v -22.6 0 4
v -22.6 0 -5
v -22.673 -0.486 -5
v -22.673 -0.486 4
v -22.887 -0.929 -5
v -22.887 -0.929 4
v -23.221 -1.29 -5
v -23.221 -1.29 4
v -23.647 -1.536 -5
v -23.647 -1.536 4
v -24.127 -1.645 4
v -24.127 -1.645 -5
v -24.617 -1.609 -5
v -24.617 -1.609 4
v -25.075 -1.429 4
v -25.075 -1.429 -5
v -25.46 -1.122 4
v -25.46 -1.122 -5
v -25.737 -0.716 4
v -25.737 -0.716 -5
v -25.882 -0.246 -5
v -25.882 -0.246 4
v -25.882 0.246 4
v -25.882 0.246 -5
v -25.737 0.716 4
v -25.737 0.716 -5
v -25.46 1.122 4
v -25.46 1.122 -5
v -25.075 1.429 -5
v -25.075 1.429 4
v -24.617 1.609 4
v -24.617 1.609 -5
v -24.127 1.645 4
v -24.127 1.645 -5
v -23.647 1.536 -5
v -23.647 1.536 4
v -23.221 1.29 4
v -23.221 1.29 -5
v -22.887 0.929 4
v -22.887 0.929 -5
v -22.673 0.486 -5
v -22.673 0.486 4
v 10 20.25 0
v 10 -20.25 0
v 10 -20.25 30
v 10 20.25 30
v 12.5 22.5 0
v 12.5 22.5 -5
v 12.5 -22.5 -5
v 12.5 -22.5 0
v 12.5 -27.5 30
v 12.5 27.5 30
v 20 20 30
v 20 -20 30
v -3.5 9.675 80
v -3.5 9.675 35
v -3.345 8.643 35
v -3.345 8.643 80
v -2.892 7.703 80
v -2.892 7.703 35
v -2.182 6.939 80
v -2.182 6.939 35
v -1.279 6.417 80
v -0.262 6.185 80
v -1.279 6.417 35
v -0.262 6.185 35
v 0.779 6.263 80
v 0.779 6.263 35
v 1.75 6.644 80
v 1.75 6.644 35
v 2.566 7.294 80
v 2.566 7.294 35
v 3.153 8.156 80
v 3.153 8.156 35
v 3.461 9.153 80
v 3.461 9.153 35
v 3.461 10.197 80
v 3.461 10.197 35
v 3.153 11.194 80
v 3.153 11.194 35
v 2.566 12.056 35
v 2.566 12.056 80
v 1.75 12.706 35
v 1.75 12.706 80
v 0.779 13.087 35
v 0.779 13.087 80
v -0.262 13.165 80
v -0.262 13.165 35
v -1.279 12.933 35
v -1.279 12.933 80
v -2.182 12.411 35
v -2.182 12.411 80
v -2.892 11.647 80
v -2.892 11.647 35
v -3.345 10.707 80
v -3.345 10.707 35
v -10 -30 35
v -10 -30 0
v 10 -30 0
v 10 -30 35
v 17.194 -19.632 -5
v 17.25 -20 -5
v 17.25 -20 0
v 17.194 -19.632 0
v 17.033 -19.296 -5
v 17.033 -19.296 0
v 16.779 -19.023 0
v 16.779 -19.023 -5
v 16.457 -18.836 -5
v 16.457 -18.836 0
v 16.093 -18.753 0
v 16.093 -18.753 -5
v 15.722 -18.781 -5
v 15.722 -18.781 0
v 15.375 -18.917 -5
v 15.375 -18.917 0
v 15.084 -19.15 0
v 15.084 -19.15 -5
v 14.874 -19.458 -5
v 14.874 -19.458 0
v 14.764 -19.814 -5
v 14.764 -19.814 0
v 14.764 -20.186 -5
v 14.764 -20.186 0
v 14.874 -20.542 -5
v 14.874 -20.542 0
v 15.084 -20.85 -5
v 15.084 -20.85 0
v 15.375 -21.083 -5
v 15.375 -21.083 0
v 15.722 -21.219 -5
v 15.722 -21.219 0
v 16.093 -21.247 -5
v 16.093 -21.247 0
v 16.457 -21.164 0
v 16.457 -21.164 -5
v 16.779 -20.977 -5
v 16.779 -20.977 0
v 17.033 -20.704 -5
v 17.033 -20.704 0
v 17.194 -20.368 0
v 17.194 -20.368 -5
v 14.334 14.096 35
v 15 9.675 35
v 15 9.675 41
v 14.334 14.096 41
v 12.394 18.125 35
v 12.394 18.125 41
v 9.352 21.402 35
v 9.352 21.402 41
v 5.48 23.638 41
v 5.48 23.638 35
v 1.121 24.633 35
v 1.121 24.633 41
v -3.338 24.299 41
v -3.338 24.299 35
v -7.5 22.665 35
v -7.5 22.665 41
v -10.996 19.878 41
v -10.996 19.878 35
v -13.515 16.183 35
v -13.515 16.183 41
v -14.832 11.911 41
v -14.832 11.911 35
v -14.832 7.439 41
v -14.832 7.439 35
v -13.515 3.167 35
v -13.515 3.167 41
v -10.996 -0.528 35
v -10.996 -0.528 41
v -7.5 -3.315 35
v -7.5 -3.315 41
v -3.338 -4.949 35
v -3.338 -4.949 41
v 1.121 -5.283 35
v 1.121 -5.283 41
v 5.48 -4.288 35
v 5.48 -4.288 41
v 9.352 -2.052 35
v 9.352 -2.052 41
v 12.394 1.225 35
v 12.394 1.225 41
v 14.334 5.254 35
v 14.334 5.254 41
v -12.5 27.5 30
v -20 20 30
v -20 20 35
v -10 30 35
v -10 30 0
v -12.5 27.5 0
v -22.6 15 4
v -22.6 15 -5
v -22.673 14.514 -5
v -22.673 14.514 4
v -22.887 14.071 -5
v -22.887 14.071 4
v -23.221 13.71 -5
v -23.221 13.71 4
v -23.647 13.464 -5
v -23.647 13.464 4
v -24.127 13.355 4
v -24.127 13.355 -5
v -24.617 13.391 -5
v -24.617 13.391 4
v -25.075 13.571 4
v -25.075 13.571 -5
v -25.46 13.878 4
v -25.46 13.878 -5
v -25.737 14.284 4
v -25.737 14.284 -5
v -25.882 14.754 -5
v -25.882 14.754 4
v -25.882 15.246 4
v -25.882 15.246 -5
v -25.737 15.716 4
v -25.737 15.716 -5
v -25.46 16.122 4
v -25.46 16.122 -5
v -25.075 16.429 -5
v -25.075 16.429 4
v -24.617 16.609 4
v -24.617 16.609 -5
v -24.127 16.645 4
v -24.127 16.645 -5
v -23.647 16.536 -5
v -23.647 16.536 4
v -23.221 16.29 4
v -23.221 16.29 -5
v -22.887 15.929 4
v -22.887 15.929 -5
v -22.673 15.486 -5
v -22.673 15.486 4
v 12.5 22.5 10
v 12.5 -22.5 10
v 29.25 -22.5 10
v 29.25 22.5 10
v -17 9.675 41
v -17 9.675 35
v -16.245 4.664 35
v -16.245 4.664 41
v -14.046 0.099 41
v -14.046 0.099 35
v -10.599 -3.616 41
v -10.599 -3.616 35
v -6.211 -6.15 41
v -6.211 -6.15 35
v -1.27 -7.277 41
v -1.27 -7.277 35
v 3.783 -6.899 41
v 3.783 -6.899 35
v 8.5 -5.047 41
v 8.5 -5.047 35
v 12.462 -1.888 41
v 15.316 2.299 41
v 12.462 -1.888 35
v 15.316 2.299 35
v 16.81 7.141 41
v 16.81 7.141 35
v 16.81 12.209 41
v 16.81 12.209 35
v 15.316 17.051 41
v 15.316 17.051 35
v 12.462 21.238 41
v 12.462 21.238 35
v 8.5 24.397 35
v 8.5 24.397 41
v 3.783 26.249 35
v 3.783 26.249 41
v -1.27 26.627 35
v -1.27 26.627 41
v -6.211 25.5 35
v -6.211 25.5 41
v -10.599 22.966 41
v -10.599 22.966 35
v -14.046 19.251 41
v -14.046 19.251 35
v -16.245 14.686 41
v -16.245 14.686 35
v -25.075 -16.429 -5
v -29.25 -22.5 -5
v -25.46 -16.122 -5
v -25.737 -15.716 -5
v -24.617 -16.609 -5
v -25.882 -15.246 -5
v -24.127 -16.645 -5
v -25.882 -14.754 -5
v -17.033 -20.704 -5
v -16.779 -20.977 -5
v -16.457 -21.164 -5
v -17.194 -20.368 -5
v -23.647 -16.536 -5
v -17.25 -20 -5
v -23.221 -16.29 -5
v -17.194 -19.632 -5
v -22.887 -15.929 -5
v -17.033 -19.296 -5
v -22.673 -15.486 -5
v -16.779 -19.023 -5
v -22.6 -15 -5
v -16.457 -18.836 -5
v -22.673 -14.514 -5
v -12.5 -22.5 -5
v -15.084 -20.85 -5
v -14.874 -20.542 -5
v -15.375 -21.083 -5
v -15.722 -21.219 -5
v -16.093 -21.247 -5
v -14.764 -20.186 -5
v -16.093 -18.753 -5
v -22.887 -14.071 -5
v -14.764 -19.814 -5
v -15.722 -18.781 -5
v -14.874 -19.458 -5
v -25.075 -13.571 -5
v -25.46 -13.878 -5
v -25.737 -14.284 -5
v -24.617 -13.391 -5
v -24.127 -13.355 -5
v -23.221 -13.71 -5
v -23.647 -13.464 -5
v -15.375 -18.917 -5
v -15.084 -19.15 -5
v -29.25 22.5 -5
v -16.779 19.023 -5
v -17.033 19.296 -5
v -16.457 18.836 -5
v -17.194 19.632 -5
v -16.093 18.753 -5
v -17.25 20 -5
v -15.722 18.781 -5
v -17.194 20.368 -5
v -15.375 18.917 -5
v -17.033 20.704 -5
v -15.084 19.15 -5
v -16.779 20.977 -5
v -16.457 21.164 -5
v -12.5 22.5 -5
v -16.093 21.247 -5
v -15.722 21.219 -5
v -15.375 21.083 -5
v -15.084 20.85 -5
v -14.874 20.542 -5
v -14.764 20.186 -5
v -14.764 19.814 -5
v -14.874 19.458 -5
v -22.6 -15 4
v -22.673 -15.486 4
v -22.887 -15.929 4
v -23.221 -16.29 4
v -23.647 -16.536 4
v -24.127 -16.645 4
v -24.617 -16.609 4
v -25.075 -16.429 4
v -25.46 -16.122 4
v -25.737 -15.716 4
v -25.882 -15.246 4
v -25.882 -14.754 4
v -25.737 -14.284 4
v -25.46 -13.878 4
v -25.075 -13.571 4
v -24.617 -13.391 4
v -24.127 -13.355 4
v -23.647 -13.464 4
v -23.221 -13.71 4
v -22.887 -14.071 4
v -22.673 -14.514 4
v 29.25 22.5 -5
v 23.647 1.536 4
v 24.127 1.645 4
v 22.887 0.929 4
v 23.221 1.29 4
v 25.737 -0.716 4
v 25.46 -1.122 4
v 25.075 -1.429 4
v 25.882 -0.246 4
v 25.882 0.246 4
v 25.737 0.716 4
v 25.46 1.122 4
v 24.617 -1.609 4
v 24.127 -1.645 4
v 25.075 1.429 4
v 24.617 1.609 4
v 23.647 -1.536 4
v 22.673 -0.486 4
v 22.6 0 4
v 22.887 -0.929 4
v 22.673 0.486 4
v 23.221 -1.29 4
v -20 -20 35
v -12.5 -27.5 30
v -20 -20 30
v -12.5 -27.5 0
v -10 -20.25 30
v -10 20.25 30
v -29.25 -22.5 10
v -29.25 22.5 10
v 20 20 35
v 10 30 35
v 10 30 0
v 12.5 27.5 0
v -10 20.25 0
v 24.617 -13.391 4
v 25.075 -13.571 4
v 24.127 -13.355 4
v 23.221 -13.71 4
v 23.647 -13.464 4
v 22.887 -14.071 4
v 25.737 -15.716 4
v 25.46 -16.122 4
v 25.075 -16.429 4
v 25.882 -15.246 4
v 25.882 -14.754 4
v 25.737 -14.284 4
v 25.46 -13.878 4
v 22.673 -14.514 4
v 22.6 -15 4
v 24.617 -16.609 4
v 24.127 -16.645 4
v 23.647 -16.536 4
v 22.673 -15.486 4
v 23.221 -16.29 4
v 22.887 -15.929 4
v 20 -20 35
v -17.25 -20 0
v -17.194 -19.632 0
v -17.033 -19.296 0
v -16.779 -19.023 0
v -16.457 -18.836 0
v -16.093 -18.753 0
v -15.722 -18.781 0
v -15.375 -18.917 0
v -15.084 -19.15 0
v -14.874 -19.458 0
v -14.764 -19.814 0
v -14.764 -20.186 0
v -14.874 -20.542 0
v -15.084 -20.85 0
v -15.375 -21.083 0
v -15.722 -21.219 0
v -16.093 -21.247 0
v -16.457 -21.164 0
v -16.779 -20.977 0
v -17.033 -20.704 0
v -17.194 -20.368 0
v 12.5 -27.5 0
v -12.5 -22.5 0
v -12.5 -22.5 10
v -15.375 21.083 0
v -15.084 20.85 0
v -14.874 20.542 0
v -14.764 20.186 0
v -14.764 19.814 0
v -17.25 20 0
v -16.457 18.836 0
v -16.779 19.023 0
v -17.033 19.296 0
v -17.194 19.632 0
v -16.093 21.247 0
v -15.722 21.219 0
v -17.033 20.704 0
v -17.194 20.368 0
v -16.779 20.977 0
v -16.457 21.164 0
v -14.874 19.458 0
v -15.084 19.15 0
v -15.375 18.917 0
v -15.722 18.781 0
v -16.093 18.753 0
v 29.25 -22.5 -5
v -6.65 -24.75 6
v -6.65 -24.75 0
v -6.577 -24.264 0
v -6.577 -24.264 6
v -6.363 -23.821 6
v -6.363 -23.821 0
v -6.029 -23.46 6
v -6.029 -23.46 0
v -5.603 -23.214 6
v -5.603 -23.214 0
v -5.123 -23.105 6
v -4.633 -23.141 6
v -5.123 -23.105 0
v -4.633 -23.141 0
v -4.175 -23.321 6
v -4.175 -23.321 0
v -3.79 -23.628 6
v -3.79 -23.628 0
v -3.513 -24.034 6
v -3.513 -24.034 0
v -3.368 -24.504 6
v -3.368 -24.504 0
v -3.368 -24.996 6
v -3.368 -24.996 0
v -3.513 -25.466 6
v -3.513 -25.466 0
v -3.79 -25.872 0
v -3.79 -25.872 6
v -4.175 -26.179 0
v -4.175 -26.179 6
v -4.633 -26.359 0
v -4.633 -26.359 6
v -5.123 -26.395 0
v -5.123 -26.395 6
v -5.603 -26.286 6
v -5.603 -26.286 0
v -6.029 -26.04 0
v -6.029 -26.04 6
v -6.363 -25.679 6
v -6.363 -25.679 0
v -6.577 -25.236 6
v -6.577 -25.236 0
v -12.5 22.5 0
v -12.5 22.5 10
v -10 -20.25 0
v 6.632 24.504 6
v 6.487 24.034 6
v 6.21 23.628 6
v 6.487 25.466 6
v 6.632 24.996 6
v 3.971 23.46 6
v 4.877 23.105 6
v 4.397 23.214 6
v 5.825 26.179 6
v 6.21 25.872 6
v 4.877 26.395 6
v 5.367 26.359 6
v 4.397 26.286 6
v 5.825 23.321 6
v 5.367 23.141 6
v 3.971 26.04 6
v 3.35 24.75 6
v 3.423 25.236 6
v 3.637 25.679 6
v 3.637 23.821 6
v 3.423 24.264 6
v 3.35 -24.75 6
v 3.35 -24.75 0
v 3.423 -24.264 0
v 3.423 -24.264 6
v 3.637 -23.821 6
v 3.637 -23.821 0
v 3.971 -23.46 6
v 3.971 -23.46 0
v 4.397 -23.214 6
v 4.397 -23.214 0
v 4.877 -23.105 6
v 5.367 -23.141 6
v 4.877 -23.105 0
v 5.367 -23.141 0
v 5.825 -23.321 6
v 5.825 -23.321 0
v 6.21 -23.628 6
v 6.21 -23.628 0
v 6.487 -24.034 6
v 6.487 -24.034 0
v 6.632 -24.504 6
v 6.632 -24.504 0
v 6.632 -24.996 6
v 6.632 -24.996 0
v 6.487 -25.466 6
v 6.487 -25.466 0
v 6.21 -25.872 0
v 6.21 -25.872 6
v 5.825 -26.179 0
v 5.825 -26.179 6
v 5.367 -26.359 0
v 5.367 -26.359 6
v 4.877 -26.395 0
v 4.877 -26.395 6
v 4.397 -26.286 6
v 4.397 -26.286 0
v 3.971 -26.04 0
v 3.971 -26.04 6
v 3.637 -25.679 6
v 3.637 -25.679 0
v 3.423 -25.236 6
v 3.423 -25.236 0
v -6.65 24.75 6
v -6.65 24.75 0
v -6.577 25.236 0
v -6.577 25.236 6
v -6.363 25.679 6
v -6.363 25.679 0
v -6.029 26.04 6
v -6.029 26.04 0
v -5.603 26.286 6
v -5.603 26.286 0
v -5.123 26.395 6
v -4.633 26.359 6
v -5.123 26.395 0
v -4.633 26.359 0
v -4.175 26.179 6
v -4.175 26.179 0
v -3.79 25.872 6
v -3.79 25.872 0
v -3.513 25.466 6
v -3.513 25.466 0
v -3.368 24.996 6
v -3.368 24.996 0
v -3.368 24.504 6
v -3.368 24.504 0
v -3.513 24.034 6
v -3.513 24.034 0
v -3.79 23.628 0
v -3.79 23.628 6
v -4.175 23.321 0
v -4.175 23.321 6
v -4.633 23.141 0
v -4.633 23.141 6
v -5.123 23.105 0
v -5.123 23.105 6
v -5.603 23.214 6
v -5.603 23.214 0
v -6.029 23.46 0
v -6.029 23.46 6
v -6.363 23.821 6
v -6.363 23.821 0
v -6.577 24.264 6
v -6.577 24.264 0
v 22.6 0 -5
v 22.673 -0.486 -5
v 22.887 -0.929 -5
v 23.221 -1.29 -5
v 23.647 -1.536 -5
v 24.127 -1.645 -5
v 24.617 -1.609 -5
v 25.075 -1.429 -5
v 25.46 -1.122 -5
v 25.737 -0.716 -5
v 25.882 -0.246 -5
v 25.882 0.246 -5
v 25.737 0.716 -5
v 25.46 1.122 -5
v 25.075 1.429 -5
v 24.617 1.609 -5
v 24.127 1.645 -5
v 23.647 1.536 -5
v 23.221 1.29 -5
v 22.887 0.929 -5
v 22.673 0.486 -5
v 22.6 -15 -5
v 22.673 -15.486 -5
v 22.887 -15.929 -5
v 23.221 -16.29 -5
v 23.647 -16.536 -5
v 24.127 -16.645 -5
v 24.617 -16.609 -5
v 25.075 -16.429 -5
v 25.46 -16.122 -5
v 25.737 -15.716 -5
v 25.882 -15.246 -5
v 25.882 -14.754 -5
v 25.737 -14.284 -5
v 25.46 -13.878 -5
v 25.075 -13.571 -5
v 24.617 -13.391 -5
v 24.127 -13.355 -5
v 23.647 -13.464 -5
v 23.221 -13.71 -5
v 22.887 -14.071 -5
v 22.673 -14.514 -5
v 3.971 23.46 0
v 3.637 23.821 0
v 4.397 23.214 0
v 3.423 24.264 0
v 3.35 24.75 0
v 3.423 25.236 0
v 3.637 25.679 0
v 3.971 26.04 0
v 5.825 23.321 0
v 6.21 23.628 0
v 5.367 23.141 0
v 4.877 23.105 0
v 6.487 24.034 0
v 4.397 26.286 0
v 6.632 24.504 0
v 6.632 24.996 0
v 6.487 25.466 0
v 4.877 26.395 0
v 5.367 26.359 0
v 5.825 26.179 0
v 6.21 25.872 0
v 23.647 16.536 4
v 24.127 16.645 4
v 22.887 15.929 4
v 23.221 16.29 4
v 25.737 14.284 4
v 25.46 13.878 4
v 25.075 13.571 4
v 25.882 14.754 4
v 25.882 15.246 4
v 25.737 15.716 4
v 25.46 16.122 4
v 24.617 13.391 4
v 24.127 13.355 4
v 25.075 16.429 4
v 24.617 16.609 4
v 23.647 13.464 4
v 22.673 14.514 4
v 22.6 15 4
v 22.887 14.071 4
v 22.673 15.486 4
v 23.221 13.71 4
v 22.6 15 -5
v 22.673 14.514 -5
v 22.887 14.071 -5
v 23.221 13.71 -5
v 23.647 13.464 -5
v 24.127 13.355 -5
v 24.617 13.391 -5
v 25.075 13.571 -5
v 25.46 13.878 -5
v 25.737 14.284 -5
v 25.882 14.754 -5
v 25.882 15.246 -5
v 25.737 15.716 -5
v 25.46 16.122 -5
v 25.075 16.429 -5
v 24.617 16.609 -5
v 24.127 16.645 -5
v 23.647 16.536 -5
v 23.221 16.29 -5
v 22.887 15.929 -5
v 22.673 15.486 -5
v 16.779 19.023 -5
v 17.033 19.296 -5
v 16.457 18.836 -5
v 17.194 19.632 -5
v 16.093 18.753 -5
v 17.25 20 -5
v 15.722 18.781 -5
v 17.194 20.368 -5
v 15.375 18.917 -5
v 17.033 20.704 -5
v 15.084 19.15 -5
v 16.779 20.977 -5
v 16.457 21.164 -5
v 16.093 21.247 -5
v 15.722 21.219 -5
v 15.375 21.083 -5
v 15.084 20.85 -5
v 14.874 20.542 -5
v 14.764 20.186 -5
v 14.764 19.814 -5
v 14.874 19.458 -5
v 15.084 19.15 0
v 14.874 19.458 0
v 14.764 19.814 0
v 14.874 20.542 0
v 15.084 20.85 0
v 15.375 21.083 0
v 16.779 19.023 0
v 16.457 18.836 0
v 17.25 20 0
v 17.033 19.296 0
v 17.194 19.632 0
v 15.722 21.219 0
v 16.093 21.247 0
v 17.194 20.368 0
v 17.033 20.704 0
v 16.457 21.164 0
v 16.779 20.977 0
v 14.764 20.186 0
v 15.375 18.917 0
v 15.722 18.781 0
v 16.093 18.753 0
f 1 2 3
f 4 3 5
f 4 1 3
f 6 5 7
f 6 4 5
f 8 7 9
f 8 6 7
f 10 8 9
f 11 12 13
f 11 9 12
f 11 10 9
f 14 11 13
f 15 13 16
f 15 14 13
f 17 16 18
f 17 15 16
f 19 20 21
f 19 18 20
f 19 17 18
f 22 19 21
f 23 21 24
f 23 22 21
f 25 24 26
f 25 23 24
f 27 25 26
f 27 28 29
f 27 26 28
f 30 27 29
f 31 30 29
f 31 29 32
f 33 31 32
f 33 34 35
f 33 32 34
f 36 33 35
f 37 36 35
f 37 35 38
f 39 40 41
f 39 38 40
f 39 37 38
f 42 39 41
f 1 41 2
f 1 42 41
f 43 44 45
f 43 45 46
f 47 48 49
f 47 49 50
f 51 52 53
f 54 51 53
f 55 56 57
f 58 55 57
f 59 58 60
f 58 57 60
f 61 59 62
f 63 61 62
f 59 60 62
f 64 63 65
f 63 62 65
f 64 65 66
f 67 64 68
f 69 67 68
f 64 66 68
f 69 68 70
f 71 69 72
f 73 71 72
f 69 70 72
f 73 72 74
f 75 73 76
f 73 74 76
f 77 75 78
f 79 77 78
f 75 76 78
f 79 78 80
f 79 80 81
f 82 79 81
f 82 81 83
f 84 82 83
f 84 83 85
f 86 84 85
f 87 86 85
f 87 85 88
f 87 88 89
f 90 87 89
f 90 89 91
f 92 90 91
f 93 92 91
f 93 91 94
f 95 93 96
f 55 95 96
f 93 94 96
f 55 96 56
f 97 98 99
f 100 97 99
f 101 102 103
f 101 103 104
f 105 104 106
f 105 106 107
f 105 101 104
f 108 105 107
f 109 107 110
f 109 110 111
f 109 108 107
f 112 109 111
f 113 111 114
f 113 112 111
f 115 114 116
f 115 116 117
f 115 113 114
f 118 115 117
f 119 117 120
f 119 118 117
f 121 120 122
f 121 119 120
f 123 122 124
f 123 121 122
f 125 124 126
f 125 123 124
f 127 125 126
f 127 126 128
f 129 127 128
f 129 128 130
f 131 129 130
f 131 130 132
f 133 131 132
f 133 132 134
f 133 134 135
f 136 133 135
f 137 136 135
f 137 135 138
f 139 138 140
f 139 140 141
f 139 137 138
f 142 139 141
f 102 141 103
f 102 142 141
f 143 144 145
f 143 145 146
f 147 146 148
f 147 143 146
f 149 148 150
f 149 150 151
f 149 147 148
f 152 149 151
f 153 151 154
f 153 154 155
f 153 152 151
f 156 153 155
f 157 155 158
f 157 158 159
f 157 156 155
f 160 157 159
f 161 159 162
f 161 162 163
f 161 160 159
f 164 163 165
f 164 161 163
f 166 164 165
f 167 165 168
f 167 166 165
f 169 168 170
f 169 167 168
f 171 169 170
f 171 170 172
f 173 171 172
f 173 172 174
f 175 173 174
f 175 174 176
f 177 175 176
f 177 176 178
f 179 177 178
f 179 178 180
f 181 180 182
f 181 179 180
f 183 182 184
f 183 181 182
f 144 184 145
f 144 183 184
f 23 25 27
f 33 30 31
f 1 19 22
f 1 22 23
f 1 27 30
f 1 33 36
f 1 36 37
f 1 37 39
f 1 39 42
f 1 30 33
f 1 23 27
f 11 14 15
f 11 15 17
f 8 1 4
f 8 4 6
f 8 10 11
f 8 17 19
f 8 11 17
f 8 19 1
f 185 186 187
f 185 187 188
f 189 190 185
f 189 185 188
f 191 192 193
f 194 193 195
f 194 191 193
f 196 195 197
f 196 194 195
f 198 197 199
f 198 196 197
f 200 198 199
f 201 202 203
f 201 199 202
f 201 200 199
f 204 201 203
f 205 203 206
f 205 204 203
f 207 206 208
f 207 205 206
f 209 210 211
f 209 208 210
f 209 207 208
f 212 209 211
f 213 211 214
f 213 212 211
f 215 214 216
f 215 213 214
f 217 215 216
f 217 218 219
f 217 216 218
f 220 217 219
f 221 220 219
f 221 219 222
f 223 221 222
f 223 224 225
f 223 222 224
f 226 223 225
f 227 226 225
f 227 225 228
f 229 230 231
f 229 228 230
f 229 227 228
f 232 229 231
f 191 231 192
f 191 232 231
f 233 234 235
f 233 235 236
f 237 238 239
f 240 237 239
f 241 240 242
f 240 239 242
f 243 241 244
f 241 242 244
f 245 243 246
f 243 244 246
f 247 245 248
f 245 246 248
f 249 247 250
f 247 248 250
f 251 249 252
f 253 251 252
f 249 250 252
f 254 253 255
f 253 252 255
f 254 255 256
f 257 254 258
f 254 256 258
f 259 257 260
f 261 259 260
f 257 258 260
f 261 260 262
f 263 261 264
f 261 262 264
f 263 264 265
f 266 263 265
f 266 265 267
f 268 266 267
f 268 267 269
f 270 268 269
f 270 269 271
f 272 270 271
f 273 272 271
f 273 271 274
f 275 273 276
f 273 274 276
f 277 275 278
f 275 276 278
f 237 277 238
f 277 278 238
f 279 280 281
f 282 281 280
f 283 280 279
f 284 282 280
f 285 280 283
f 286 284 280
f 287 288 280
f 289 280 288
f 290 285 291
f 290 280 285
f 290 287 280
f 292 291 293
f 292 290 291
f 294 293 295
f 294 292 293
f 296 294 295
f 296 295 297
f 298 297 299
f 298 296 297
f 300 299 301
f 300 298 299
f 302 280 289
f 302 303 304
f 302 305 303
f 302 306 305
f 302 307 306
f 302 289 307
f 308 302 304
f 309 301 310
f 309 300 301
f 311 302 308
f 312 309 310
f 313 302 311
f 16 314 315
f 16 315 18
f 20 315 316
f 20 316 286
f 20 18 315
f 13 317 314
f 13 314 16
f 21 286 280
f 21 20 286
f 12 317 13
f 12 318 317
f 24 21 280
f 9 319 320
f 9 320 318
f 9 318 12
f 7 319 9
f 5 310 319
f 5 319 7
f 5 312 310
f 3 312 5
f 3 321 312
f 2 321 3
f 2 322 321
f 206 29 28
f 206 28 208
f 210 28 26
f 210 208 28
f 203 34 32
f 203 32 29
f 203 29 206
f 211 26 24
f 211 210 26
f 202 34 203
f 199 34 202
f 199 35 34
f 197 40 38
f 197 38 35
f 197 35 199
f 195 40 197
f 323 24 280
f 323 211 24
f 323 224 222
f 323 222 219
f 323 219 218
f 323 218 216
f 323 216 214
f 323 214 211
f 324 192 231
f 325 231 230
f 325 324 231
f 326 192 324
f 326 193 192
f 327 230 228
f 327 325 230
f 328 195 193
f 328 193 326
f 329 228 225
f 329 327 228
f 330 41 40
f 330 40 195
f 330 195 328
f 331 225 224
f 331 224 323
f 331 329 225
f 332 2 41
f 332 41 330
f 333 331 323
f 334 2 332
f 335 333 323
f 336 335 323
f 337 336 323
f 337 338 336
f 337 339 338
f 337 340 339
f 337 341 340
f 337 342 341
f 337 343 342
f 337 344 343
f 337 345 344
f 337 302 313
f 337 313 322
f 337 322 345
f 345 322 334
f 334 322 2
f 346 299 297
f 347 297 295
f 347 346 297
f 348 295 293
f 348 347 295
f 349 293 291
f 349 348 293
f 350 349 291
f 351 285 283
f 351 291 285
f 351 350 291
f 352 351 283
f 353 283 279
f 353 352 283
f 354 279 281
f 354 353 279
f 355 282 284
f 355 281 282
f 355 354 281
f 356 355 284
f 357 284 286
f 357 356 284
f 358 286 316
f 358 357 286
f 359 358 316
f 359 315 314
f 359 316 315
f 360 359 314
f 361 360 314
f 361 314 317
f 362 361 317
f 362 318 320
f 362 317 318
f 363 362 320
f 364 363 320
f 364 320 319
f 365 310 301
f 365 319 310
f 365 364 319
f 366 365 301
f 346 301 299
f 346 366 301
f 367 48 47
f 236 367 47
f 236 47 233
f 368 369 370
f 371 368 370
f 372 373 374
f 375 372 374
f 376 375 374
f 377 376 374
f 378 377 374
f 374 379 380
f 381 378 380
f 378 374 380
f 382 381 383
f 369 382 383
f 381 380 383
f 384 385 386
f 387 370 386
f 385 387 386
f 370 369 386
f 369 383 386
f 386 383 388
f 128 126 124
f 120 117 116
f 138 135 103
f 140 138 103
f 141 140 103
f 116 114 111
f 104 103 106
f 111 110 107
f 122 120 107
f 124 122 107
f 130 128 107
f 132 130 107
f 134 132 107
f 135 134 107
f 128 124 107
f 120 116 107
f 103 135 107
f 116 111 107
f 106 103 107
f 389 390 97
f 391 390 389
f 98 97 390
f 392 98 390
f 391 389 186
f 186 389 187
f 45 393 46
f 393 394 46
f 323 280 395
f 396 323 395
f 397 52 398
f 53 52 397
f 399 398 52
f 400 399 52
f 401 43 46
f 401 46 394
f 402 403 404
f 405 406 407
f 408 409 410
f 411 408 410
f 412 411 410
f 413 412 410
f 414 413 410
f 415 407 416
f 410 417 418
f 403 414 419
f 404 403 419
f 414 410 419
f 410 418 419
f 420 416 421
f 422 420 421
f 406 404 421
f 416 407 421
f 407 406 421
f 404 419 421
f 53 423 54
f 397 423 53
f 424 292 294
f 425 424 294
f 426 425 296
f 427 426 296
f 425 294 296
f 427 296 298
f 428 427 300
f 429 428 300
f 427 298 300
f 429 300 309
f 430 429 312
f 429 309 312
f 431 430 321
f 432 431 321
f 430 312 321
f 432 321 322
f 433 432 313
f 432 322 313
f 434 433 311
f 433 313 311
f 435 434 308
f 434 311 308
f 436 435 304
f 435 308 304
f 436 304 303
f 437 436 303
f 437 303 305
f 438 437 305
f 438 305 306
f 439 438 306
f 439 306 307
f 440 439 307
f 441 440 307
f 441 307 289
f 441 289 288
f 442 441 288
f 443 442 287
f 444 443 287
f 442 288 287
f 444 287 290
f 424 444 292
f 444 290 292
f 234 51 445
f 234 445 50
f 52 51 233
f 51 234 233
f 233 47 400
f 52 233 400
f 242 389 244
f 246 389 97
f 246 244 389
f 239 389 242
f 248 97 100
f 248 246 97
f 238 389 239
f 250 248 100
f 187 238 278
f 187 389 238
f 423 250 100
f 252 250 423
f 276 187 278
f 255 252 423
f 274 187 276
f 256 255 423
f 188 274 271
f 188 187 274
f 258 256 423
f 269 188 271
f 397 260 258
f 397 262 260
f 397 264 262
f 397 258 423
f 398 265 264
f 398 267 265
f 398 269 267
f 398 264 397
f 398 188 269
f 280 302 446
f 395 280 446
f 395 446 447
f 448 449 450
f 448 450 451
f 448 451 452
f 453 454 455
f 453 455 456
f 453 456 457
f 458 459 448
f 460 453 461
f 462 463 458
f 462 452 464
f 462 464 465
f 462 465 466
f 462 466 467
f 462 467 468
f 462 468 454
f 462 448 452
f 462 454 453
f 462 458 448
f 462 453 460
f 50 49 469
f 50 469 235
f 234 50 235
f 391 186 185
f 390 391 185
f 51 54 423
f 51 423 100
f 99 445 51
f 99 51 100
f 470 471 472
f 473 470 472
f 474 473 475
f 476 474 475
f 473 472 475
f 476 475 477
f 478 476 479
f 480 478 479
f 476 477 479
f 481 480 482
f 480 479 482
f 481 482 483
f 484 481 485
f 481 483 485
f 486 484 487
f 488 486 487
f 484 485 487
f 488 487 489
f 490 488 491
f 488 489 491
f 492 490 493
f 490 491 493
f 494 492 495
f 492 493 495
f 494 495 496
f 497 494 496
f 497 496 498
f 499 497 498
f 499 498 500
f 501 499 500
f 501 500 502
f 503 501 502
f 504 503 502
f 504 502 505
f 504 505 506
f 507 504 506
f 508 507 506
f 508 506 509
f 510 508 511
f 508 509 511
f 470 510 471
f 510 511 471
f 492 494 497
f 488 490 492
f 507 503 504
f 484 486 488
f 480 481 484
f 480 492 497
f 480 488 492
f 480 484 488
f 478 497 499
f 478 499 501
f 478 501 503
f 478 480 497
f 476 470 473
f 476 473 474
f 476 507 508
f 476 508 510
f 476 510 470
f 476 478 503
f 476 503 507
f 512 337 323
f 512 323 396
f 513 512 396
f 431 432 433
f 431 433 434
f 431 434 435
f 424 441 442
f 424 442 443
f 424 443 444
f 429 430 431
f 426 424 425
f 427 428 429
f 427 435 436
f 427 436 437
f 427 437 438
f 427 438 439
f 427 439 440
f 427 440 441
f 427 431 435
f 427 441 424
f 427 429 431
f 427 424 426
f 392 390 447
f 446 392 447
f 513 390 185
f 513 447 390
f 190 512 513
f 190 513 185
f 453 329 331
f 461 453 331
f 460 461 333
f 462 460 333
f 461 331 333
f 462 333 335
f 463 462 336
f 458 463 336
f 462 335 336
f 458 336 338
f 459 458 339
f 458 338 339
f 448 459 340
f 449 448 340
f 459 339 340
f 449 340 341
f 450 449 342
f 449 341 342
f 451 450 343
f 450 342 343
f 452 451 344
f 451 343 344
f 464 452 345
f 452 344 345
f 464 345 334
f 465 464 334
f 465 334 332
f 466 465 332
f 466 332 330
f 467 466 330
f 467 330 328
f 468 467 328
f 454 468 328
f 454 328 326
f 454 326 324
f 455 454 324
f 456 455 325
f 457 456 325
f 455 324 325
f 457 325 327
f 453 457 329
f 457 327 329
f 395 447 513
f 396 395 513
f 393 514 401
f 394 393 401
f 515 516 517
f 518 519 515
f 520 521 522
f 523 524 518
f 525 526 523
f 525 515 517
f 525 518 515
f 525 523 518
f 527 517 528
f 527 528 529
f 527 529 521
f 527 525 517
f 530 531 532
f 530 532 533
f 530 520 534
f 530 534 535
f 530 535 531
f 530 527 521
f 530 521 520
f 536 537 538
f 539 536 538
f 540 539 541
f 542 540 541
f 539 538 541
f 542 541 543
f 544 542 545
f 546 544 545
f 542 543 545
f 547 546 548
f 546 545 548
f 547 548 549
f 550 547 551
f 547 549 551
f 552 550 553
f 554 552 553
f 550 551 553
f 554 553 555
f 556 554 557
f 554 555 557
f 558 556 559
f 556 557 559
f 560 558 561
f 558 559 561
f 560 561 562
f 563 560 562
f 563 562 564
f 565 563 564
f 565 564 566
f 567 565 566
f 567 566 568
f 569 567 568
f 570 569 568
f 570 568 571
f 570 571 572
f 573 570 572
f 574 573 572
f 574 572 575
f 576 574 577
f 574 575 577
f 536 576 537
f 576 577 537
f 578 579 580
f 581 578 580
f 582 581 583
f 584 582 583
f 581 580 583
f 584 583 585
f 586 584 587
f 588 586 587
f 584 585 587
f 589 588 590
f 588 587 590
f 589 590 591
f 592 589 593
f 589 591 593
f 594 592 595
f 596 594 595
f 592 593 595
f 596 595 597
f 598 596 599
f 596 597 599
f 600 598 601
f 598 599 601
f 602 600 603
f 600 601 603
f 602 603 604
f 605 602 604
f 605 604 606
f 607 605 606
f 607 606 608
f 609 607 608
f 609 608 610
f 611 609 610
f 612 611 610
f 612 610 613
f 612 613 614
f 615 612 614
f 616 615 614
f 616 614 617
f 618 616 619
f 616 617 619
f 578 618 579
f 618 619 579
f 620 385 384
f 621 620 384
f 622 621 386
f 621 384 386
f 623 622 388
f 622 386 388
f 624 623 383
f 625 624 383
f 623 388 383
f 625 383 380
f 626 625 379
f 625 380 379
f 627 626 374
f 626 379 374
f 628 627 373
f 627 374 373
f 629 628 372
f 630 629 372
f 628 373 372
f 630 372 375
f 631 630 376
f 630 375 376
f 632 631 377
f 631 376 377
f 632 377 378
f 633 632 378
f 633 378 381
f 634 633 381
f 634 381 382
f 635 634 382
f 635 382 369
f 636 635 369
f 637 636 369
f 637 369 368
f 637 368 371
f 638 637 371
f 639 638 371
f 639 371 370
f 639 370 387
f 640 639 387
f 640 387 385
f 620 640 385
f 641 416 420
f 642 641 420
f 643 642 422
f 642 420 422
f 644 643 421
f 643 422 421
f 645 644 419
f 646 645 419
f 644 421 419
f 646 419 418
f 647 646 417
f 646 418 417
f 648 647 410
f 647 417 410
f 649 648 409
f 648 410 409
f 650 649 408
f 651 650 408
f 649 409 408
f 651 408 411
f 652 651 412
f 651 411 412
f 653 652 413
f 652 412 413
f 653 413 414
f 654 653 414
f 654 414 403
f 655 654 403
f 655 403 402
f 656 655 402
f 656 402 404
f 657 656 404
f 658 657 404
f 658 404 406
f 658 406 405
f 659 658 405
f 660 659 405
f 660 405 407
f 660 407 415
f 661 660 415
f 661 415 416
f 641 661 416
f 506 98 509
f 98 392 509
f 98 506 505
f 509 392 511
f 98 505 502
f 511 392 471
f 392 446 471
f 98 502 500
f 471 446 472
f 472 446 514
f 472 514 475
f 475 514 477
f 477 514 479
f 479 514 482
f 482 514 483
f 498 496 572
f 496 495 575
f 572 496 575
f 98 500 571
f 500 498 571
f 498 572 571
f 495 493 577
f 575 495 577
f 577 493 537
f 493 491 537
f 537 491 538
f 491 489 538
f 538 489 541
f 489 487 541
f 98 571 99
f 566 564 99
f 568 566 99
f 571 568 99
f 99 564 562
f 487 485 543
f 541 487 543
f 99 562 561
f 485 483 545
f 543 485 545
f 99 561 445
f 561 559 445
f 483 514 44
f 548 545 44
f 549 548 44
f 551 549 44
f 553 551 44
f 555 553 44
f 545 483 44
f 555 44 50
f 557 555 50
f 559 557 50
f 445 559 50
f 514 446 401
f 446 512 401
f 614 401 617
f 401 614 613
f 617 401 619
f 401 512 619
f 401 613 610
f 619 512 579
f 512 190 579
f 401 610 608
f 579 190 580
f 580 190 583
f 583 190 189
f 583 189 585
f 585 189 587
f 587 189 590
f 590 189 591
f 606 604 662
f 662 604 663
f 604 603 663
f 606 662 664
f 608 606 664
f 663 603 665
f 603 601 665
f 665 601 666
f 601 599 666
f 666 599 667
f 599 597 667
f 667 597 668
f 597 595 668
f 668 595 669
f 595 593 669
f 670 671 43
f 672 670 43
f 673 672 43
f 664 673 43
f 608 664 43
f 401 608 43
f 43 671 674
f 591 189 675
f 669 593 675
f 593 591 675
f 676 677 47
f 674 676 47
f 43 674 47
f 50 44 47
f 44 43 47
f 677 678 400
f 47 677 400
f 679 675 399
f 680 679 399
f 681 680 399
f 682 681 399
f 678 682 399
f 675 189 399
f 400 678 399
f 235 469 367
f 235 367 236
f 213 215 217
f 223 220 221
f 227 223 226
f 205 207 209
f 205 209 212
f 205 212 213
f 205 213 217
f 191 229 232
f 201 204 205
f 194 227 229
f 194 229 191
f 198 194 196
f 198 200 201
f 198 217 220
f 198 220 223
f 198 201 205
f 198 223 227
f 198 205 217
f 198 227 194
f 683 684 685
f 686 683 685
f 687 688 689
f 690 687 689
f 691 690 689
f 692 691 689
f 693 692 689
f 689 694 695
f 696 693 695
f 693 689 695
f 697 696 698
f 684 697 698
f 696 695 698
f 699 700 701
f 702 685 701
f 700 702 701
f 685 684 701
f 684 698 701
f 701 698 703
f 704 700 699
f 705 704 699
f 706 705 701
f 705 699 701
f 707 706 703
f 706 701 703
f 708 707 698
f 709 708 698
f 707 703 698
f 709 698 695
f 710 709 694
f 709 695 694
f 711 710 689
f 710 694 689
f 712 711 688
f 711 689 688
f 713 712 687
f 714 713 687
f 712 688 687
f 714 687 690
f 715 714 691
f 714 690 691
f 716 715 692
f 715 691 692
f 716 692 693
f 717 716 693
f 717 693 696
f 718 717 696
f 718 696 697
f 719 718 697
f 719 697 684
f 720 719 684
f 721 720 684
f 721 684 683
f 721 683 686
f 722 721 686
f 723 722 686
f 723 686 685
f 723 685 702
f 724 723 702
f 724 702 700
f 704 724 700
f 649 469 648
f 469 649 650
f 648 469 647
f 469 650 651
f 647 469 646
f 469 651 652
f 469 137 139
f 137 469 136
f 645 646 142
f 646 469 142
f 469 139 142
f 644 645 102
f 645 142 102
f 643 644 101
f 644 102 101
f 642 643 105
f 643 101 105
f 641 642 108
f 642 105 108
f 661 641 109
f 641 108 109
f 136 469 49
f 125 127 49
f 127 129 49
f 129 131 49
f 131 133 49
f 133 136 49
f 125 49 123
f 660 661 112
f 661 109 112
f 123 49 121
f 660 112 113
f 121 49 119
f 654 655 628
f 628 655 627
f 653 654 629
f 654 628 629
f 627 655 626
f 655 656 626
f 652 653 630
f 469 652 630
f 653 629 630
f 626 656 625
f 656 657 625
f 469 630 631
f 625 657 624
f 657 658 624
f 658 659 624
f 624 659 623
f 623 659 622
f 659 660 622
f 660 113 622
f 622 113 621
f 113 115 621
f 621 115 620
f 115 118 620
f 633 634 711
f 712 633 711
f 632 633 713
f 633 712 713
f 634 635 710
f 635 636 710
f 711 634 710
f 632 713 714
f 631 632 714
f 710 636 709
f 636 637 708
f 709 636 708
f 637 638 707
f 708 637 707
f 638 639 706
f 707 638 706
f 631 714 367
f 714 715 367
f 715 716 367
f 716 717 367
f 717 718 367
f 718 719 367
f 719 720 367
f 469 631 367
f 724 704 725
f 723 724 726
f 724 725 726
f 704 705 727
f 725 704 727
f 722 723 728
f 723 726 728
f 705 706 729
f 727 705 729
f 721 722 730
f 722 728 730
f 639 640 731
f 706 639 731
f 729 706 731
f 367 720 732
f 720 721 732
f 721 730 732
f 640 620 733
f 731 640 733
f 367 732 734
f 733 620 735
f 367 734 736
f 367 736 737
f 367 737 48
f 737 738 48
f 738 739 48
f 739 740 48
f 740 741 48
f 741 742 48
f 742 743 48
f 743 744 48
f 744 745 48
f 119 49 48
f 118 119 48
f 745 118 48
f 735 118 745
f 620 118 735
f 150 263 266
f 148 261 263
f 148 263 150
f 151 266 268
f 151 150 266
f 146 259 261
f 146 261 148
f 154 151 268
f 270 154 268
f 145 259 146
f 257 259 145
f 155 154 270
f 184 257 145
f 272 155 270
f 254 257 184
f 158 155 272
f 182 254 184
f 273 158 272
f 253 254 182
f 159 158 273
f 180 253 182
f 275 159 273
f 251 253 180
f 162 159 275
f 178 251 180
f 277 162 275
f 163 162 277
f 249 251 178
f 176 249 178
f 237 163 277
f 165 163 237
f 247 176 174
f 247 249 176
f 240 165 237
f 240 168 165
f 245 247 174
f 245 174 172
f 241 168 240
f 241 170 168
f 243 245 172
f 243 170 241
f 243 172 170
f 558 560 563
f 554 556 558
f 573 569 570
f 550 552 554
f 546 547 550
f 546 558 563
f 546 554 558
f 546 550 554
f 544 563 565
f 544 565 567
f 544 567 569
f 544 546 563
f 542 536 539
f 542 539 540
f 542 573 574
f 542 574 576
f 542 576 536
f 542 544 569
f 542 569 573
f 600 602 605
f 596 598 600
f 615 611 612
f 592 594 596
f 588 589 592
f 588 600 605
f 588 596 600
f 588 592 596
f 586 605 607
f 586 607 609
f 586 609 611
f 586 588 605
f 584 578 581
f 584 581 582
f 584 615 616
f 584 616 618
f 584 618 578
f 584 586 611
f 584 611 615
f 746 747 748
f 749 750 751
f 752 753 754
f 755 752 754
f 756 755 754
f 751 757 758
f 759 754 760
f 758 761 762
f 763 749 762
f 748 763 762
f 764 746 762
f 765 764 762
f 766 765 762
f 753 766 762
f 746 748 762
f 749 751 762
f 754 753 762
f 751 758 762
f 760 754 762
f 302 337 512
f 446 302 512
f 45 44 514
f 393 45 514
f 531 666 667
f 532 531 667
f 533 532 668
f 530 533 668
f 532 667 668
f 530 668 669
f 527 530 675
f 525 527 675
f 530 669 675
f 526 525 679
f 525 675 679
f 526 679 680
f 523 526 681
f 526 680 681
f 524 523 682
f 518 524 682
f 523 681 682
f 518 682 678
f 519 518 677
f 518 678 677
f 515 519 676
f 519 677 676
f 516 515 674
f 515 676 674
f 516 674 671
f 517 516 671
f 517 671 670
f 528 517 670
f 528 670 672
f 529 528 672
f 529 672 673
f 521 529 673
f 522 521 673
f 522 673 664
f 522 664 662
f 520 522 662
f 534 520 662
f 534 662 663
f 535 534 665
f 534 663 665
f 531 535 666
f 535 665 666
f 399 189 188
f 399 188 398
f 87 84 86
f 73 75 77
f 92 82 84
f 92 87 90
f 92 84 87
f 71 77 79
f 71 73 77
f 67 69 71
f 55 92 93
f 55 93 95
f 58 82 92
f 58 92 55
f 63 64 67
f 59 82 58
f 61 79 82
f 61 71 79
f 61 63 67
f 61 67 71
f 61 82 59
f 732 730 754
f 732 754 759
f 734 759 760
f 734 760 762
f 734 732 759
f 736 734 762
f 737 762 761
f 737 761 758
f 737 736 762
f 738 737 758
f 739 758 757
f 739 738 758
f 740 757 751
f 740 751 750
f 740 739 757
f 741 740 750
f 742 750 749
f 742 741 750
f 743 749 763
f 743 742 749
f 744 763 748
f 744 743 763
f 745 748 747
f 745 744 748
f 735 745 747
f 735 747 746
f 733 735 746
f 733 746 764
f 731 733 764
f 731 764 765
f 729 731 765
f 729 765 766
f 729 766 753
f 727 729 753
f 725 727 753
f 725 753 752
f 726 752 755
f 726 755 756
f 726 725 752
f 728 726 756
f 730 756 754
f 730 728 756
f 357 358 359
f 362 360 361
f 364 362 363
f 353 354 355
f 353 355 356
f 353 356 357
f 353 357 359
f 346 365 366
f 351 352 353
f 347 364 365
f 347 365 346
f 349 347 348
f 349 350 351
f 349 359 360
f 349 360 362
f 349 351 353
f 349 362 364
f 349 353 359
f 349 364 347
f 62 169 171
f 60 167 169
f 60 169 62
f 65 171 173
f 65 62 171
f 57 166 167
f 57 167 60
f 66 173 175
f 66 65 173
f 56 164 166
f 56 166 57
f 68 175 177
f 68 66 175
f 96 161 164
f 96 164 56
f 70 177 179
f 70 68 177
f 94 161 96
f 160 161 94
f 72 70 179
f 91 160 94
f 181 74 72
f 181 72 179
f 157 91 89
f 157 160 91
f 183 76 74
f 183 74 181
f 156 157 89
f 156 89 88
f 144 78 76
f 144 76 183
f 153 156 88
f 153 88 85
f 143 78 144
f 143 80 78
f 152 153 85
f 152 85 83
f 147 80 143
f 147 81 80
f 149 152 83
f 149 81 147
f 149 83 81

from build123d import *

# Parameters (mm, degrees)
SKETCH_1_W          = 25
SKETCH_1_H          = 60
EXTRUDE_1_DEPTH     = 35
SKETCH_2_W          = 20
SKETCH_2_H          = 40.5
CUT_EXTRUDE_1_DEPTH = 31.5
SKETCH_5_W          = 40
SKETCH_5_H          = 60
EXTRUDE_4_DEPTH     = 5
SKETCH_6_R          = 1.65
CUT_EXTRUDE_2_DEPTH = 6
SKETCH_10_W         = 15
SKETCH_10_H         = 45
EXTRUDE_7_DEPTH     = 16.75
SKETCH_18_R         = 1.25
CUT_EXTRUDE_4_DEPTH = 5
CUT_EXTRUDE_START   = -4
SKETCH_17_R         = 1.65
CUT_EXTRUDE_3_DEPTH = 12
SKETCH_13_R         = 3.5
EXTRUDE_10_DEPTH    = 45
SKETCH_15_R         = 17
SKETCH_15_R_2       = 15
EXTRUDE_11_DEPTH    = 6
CHAMFER_START       = 30
CHAMFER_3_DEPTH     = 5
CHAMFER_START_2     = -1
CHAMFER_3_2_DEPTH   = 31


with BuildPart() as part:
    # 草圖1 → 填料-伸長1 (new body)
    with BuildSketch(Plane.XY):
        Rectangle(SKETCH_1_W, SKETCH_1_H)
    extrude(amount=EXTRUDE_1_DEPTH)

    # 草圖2 → 除料-伸長1 (cut)
    with BuildSketch(Plane(origin=(0, 0, 0), x_dir=(-1, 0, 0), z_dir=(0, 0, -1))):
        Rectangle(SKETCH_2_W, SKETCH_2_H)
    extrude(amount=-CUT_EXTRUDE_1_DEPTH, mode=Mode.SUBTRACT)

    # 草圖5 → 填料-伸長4 (add)
    with BuildSketch(Plane.XY.offset(35)):
        Rectangle(SKETCH_5_W, SKETCH_5_H)
    extrude(amount=-EXTRUDE_4_DEPTH)

    # 草圖6 → 除料-伸長2 (cut)
    with BuildSketch(Plane(origin=(0, 0, 0), x_dir=(-1, 0, 0), z_dir=(0, 0, -1))):
        with Locations((5, 24.75)):
            Circle(SKETCH_6_R)
        with Locations((-5, 24.75)):
            Circle(SKETCH_6_R)
        with Locations((-5, -24.75)):
            Circle(SKETCH_6_R)
        with Locations((5, -24.75)):
            Circle(SKETCH_6_R)
    extrude(amount=-CUT_EXTRUDE_2_DEPTH, mode=Mode.SUBTRACT)

    # 草圖10 → 填料-伸長7 (add)
    with BuildSketch(Plane.ZY.offset(12.5)):
        with Locations((2.5, 0)):
            Rectangle(SKETCH_10_W, SKETCH_10_H)
    extrude_7 = extrude(amount=EXTRUDE_7_DEPTH)

    # 草圖18 → 除料-伸長4 (cut)
    with BuildSketch(Plane(origin=(0, 0, -5), x_dir=(-1, 0, 0), z_dir=(0, 0, -1))):
        with Locations((16, -20)):
            Circle(SKETCH_18_R)
        with Locations((16, 20)):
            Circle(SKETCH_18_R)
    cut_extrude_4 = extrude(amount=-CUT_EXTRUDE_4_DEPTH, mode=Mode.SUBTRACT)

    # 草圖17 → 除料-伸長3 (cut)
    with BuildSketch(Plane(origin=(0, 0, 0), x_dir=(-1, 0, 0), z_dir=(0, 0, -1)).offset(CUT_EXTRUDE_START)):
        with Locations(Location((24.25, 0, 0), (0, 0, 180))):
            Circle(SKETCH_17_R)
        with Locations(Location((24.25, -15, 0), (0, 0, 180))):
            Circle(SKETCH_17_R)
        with Locations(Location((24.25, 15, 0), (0, 0, 180))):
            Circle(SKETCH_17_R)
    cut_extrude_3 = extrude(amount=CUT_EXTRUDE_3_DEPTH, mode=Mode.SUBTRACT)

    # 鏡射1: 填料-伸長7, 除料-伸長4, 除料-伸長3 across plane
    add(extrude_7.mirror(Plane(origin=(0, 0, 0), x_dir=(0, 0, 1), z_dir=(1, 0, 0))))
    add(cut_extrude_4.mirror(Plane(origin=(0, 0, 0), x_dir=(0, 0, 1), z_dir=(1, 0, 0))), mode=Mode.SUBTRACT)
    add(cut_extrude_3.mirror(Plane(origin=(0, 0, 0), x_dir=(0, 0, 1), z_dir=(1, 0, 0))), mode=Mode.SUBTRACT)

    # 草圖13 → 填料-伸長10 (add)
    with BuildSketch(Plane.XY.offset(35)):
        with Locations(Location((0, 9.675, 0), (0, 0, 180))):
            Circle(SKETCH_13_R)
    extrude(amount=EXTRUDE_10_DEPTH)

    # 草圖15 → 填料-伸長11 (add)
    with BuildSketch(Plane.XY.offset(35)):
        with Locations(Location((0, 9.675, 0), (0, 0, 180))):
            Circle(SKETCH_15_R)
        with Locations((0, 9.675)):
            Circle(SKETCH_15_R_2, mode=Mode.SUBTRACT)
    extrude(amount=EXTRUDE_11_DEPTH)

    # 導角3: read off the stored shape, not the designer's step
    # 導角3 outline → 導角3 (cut)
    with BuildSketch(Plane.XY.offset(CHAMFER_START)):
        Polygon((20, 20), (20, 30), (10, 30), align=None)
        Polygon((20, -30), (20, -20), (10, -30), align=None)
        Polygon((-10, 30), (-20, 30), (-20, 20), align=None)
        Polygon((-10, -30), (-20, -20), (-20, -30), align=None)
    extrude(amount=CHAMFER_3_DEPTH, mode=Mode.SUBTRACT)

    # Chamfer 3 2 outline → Chamfer 3 2 (cut)
    with BuildSketch(Plane.XY.offset(CHAMFER_START_2)):
        Polygon((10, 30), (12.5, 27.5), (12.5, 30), align=None)
        Polygon((12.5, -30), (12.5, -27.5), (10, -30), align=None)
        Polygon((-12.5, 27.5), (-10, 30), (-12.5, 30), align=None)
        Polygon((-12.5, -30), (-10, -30), (-12.5, -27.5), align=None)
    extrude(amount=CHAMFER_3_2_DEPTH, mode=Mode.SUBTRACT)


solid = part.part
